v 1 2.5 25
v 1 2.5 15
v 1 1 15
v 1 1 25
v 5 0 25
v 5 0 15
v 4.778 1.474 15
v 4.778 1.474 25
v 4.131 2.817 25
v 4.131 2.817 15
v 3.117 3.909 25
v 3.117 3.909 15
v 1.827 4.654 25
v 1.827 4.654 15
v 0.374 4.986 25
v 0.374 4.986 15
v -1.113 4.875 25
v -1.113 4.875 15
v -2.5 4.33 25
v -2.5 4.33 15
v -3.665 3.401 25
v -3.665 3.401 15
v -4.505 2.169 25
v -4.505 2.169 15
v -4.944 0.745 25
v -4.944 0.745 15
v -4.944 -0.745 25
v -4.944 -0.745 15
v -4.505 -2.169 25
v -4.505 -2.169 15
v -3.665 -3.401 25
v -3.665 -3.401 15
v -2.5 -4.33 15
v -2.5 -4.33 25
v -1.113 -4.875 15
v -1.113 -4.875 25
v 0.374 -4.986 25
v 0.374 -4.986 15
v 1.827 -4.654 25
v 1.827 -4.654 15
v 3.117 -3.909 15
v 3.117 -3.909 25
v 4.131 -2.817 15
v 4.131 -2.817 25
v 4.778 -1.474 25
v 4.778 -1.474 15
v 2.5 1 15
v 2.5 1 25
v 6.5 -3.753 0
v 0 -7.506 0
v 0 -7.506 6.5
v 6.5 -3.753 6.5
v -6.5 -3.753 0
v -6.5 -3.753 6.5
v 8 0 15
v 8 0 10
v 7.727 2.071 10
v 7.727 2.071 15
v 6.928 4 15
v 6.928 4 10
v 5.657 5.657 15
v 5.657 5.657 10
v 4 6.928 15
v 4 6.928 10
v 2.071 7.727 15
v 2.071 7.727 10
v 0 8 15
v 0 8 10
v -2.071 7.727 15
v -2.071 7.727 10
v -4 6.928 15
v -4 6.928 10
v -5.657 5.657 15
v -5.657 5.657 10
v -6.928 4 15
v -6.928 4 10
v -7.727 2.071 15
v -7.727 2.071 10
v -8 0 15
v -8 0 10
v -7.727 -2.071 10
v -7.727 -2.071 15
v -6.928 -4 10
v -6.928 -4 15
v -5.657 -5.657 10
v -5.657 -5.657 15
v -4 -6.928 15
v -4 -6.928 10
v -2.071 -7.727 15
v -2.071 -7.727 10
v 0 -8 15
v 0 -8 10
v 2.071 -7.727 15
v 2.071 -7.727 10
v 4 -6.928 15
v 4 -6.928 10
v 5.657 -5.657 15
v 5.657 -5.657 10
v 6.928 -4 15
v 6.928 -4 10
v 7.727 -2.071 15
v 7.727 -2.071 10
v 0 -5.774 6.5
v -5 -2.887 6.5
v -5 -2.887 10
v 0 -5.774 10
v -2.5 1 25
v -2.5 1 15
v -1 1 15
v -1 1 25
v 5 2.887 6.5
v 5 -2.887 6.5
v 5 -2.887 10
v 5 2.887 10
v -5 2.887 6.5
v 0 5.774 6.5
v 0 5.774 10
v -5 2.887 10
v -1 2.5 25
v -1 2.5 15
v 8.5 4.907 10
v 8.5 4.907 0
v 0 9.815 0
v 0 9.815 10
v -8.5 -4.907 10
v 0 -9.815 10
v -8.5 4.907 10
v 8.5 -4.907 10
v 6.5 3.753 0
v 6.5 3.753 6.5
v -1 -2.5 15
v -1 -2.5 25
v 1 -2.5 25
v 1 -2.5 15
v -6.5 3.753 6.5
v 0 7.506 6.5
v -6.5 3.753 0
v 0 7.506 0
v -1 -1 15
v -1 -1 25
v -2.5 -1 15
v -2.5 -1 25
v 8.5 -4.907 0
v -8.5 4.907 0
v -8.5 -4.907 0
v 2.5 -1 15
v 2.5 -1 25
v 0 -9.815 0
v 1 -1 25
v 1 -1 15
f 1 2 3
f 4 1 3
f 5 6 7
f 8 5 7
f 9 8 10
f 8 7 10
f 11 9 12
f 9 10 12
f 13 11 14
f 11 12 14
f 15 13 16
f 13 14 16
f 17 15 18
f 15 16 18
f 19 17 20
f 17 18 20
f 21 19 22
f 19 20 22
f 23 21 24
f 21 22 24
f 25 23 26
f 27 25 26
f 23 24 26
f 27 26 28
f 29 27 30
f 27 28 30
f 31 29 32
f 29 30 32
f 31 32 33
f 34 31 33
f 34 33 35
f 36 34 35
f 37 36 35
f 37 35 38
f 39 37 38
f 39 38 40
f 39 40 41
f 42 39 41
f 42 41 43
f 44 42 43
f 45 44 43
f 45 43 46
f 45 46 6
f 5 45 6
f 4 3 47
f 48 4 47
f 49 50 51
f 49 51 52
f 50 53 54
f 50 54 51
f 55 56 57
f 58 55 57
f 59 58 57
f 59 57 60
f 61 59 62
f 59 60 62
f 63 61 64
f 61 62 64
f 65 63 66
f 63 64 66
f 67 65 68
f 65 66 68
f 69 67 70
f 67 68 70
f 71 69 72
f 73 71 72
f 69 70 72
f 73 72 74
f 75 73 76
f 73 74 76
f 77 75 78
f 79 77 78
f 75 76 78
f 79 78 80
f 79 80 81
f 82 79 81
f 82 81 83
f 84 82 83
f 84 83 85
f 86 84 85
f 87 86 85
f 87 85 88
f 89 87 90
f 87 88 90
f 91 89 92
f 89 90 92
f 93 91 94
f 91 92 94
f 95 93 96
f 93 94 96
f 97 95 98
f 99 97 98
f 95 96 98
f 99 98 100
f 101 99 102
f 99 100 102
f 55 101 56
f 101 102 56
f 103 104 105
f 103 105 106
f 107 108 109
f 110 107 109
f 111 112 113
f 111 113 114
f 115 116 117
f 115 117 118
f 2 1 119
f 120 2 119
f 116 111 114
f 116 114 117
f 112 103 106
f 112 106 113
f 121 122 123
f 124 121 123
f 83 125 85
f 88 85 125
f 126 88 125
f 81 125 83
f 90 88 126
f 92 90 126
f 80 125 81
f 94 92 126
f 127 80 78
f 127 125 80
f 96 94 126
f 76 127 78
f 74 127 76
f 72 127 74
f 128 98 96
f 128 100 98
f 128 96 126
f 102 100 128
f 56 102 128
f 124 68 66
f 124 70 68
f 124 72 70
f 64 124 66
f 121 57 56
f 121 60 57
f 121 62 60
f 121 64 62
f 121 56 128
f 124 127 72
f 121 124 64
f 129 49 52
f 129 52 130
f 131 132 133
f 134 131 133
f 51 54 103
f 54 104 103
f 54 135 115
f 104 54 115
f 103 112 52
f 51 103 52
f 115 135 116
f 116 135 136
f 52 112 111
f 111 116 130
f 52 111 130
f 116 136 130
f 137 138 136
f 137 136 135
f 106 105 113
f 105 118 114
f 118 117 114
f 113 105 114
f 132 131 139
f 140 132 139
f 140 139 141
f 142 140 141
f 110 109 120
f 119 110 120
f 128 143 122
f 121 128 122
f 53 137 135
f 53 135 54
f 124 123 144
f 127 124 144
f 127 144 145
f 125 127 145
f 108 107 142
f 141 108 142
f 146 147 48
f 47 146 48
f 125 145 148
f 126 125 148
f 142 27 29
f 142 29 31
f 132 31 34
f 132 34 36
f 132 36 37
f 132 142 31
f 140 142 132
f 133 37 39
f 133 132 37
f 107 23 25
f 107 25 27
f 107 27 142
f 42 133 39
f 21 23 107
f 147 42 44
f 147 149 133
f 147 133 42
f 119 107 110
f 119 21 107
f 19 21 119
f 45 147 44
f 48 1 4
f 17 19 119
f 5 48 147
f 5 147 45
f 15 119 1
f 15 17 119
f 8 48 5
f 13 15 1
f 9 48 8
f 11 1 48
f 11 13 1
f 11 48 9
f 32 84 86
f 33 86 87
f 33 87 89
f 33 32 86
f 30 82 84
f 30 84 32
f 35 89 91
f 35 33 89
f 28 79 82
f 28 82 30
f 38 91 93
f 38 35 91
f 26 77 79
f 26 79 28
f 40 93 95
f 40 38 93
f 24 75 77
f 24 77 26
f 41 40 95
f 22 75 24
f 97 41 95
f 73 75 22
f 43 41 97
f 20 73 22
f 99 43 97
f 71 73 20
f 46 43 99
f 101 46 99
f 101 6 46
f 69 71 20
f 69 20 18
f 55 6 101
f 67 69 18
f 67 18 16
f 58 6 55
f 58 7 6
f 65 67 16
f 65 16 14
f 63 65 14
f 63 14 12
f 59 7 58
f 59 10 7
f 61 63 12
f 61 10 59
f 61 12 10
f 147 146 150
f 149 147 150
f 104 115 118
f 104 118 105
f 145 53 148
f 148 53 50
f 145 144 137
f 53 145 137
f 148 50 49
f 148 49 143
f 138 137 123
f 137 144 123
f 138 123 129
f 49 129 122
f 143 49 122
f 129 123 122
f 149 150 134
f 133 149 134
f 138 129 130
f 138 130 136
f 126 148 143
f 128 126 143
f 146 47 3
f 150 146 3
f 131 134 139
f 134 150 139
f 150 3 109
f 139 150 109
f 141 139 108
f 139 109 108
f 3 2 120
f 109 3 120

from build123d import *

# Parameters (mm, degrees)
PAD006_DEPTH      = 10
CYLINDER010_R     = 5
CYLINDER010_DEPTH = 15
PAD_DEPTH         = 6.5
PAD001_DEPTH      = 4
PAD002_DEPTH      = 10
CYLINDER011_R     = 8
CYLINDER011_DEPTH = 5


with BuildPart() as body004:
    # Sketch006 → Pad006 (new body)
    with BuildSketch(Plane.XY):
        Polygon((0, -2.5), (-1, -2.5), (-1, -1), (-2.5, -1), (-2.5, 0), (-2.5, 1), (-1, 1), (-1, 2.5), (0, 2.5), (1, 2.5), (1, 1), (2.5, 1), (2.5, 0), (2.5, -1), (1, -1), (1, -2.5), align=None)
    extrude(amount=PAD006_DEPTH)


with BuildPart() as body004_1:
    # Body004 placement: moved
    add(body004.part.moved(Location((0, 0, 15))))


with BuildPart() as cut010:
    # Cylinder010 → Cylinder010 (new body)
    with BuildSketch(Plane.XY.offset(10)):
        Circle(CYLINDER010_R)
    extrude(amount=CYLINDER010_DEPTH)

    # Cut010: cut Body004
    add(body004_1.part, mode=Mode.SUBTRACT)


with BuildPart() as cuerpo:
    # Sketch → Pad (new body)
    with BuildSketch(Plane.XY):
        Polygon((0, 7.505553), (-6.5, 3.752777), (-6.5, -3.752777), (0, -7.505553), (6.5, -3.752777), (6.5, 3.752777), align=None)
    extrude(amount=PAD_DEPTH)

    # Sketch001 (on Face8 of Pad) → Pad001 (join)
    with BuildSketch(Plane.XY.offset(6.5)):
        Polygon((0, 5.773503), (-5, 2.886751), (-5, -2.886751), (0, -5.773503), (5, -2.886751), (5, 2.886751), align=None)
    extrude(amount=PAD001_DEPTH)


with BuildPart() as cut009:
    # Sketch002 → Pad002 (new body)
    with BuildSketch(Plane.XY):
        Polygon((0, 9.814955), (-8.5, 4.907477), (-8.5, -4.907477), (0, -9.814955), (8.5, -4.907477), (8.5, 4.907477), align=None)
    extrude(amount=PAD002_DEPTH)

    # Cut009: cut Cuerpo
    add(cuerpo.part, mode=Mode.SUBTRACT)


with BuildPart() as union_motor:
    # Cylinder011 → Cylinder011 (new body)
    with BuildSketch(Plane.XY.offset(10)):
        Circle(CYLINDER011_R)
    extrude(amount=CYLINDER011_DEPTH)

    # Fusion004: union Cut010, Cut009
    add(cut010.part)
    add(cut009.part)


solid = union_motor.part
